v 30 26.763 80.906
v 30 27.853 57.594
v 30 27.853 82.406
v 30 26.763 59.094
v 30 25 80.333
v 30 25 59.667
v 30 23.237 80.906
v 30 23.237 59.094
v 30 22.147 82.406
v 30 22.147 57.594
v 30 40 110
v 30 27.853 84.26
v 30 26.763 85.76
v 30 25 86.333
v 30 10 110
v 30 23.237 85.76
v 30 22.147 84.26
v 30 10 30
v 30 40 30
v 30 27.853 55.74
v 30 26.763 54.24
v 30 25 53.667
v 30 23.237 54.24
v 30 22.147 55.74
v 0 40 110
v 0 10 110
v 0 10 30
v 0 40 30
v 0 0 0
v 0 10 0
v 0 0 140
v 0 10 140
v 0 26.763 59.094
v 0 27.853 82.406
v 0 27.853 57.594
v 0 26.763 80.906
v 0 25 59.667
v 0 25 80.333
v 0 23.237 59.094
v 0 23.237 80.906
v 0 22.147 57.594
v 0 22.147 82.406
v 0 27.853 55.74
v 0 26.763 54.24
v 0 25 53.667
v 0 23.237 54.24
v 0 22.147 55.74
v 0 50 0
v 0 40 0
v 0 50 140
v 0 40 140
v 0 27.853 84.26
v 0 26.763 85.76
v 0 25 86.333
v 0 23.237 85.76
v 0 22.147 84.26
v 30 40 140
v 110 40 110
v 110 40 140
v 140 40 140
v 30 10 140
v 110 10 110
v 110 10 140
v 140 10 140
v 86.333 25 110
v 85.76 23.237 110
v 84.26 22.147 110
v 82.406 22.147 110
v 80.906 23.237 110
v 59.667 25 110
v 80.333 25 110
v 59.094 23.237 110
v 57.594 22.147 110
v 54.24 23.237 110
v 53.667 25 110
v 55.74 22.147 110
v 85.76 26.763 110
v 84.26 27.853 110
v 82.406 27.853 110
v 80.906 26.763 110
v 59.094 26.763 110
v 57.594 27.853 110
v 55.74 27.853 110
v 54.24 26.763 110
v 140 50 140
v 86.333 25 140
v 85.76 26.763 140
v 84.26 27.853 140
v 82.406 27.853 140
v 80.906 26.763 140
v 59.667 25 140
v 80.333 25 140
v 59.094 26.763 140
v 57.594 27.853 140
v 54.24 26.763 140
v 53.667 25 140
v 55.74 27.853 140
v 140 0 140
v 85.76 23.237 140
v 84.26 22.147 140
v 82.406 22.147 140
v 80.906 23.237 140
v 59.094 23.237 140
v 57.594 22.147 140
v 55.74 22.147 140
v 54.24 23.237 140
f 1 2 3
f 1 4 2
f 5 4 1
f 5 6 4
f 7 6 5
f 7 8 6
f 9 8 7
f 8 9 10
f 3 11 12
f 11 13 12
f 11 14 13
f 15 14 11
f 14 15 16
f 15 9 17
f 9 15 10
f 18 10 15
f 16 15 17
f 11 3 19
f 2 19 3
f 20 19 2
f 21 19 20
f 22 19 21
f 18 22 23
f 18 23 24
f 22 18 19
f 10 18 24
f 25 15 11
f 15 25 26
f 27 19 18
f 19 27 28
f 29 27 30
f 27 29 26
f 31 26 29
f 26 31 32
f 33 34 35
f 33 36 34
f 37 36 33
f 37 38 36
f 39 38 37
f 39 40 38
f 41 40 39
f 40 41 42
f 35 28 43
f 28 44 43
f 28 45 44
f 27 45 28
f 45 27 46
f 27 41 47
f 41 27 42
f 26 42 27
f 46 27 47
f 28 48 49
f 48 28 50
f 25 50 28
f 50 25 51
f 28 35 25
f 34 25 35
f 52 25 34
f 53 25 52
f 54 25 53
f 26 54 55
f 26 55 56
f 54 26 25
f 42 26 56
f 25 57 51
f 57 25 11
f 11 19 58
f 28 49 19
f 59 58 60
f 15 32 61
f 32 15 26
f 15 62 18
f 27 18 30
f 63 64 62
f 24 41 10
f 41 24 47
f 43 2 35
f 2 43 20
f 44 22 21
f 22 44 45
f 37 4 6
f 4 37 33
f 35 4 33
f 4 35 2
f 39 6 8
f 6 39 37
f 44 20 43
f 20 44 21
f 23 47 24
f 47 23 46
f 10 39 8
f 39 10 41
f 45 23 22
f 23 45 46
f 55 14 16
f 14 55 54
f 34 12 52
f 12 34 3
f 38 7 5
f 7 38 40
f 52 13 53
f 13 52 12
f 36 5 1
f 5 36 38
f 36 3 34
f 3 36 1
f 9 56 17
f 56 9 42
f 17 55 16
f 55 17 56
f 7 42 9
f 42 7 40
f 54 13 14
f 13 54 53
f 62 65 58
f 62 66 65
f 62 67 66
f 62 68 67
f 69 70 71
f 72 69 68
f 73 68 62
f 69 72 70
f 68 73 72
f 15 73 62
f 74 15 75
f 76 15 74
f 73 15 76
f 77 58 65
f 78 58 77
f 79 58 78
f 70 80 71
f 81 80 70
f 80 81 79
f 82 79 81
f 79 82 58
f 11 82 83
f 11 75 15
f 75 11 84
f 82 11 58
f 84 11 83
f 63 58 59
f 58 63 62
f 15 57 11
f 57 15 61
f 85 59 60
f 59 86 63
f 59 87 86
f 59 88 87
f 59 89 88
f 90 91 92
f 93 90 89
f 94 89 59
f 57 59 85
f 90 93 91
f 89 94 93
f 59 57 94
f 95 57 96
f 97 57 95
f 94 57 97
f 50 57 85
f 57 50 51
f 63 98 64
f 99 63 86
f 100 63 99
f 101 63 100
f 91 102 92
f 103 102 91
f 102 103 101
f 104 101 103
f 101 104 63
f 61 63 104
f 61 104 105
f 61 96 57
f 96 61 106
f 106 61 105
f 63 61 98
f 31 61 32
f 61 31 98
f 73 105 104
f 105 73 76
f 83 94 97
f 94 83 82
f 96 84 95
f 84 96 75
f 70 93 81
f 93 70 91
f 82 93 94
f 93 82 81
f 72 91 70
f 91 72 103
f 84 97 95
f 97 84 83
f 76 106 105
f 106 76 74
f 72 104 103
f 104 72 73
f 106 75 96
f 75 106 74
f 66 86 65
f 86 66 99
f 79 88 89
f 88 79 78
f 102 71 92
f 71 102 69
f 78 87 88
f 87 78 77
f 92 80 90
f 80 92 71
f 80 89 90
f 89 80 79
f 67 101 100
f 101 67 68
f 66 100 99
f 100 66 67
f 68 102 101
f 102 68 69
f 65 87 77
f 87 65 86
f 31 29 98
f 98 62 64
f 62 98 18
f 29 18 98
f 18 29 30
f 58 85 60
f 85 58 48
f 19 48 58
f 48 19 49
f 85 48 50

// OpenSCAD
/* Copyright 2017 Karl-Philipp Richter

Licensed under the Apache License, Version 2.0 (the "License");
you may not use this file except in compliance with the License.
You may obtain a copy of the License at

    http://www.apache.org/licenses/LICENSE-2.0

Unless required by applicable law or agreed to in writing, software
distributed under the License is distributed on an "AS IS" BASIS,
WITHOUT WARRANTIES OR CONDITIONS OF ANY KIND, either express or implied.
See the License for the specific language governing permissions and
limitations under the License.
*/

/* An angle which can be constructed from multiple parts of recyled wood consisting of two sides (lavender color) and two support parts (yellow) which are screwed into the wall and the object to hold */

/* The angle in degrees
*/
angle = 45;
/* The effective length of the wall support side in mm (the length of the opposite support will be calculated based on angle.
*/
length = 140;
/* The width of the support in mm.
*/
support_width = 30;
/* The depth of the support in mm.
*/
support_depth = 30;
/* The thickness of the sides in mm.
*/
side_thickness = 10;
/* The diameter of the screw hole in mm.
*/
screw_hole_diameter = 6;

support_length = length-2*support_depth;
    //need to substract in order to make supports less visible
module support() {
    difference() {
        cube([support_depth, support_width, support_length]);        
        //screw holes
        translate([0, support_width/2, support_length/3]) {
            rotate([0,90,0]) {
                cylinder(support_depth, d=screw_hole_diameter, center=false);
            }
        }
        translate([0, support_width/2, support_length/3*2]) {
            rotate([0,90,0]) {
                cylinder(support_depth, d=screw_hole_diameter, center=false);
            }
        }
    }
}
translate([0, side_thickness, support_depth]) {
    support();
}
translate([support_depth, side_thickness, length]) {
    rotate([0,90,0]) {
        support();
    }
}

module side() {
    polyhedron( [[0,0,0], //bottom
        [length, 0,length], //top right
        [0,0,length], //top //left
        [0,side_thickness,0], //bottom
        [length,side_thickness, length], //top right
        [0,side_thickness,length] //top left
    ],
        [[0,2,1], //front
        [5,4,1,2], //top
        [5,2,0,3], //wall support back
        [0,1,4,3], //angle front
        [5,3,4] //back
    ]);
}

color("Lavender") {
    side();
        //side front
    translate([0,side_thickness+support_width,0]) {
        side();
    }
        //side back
}
    //sides
